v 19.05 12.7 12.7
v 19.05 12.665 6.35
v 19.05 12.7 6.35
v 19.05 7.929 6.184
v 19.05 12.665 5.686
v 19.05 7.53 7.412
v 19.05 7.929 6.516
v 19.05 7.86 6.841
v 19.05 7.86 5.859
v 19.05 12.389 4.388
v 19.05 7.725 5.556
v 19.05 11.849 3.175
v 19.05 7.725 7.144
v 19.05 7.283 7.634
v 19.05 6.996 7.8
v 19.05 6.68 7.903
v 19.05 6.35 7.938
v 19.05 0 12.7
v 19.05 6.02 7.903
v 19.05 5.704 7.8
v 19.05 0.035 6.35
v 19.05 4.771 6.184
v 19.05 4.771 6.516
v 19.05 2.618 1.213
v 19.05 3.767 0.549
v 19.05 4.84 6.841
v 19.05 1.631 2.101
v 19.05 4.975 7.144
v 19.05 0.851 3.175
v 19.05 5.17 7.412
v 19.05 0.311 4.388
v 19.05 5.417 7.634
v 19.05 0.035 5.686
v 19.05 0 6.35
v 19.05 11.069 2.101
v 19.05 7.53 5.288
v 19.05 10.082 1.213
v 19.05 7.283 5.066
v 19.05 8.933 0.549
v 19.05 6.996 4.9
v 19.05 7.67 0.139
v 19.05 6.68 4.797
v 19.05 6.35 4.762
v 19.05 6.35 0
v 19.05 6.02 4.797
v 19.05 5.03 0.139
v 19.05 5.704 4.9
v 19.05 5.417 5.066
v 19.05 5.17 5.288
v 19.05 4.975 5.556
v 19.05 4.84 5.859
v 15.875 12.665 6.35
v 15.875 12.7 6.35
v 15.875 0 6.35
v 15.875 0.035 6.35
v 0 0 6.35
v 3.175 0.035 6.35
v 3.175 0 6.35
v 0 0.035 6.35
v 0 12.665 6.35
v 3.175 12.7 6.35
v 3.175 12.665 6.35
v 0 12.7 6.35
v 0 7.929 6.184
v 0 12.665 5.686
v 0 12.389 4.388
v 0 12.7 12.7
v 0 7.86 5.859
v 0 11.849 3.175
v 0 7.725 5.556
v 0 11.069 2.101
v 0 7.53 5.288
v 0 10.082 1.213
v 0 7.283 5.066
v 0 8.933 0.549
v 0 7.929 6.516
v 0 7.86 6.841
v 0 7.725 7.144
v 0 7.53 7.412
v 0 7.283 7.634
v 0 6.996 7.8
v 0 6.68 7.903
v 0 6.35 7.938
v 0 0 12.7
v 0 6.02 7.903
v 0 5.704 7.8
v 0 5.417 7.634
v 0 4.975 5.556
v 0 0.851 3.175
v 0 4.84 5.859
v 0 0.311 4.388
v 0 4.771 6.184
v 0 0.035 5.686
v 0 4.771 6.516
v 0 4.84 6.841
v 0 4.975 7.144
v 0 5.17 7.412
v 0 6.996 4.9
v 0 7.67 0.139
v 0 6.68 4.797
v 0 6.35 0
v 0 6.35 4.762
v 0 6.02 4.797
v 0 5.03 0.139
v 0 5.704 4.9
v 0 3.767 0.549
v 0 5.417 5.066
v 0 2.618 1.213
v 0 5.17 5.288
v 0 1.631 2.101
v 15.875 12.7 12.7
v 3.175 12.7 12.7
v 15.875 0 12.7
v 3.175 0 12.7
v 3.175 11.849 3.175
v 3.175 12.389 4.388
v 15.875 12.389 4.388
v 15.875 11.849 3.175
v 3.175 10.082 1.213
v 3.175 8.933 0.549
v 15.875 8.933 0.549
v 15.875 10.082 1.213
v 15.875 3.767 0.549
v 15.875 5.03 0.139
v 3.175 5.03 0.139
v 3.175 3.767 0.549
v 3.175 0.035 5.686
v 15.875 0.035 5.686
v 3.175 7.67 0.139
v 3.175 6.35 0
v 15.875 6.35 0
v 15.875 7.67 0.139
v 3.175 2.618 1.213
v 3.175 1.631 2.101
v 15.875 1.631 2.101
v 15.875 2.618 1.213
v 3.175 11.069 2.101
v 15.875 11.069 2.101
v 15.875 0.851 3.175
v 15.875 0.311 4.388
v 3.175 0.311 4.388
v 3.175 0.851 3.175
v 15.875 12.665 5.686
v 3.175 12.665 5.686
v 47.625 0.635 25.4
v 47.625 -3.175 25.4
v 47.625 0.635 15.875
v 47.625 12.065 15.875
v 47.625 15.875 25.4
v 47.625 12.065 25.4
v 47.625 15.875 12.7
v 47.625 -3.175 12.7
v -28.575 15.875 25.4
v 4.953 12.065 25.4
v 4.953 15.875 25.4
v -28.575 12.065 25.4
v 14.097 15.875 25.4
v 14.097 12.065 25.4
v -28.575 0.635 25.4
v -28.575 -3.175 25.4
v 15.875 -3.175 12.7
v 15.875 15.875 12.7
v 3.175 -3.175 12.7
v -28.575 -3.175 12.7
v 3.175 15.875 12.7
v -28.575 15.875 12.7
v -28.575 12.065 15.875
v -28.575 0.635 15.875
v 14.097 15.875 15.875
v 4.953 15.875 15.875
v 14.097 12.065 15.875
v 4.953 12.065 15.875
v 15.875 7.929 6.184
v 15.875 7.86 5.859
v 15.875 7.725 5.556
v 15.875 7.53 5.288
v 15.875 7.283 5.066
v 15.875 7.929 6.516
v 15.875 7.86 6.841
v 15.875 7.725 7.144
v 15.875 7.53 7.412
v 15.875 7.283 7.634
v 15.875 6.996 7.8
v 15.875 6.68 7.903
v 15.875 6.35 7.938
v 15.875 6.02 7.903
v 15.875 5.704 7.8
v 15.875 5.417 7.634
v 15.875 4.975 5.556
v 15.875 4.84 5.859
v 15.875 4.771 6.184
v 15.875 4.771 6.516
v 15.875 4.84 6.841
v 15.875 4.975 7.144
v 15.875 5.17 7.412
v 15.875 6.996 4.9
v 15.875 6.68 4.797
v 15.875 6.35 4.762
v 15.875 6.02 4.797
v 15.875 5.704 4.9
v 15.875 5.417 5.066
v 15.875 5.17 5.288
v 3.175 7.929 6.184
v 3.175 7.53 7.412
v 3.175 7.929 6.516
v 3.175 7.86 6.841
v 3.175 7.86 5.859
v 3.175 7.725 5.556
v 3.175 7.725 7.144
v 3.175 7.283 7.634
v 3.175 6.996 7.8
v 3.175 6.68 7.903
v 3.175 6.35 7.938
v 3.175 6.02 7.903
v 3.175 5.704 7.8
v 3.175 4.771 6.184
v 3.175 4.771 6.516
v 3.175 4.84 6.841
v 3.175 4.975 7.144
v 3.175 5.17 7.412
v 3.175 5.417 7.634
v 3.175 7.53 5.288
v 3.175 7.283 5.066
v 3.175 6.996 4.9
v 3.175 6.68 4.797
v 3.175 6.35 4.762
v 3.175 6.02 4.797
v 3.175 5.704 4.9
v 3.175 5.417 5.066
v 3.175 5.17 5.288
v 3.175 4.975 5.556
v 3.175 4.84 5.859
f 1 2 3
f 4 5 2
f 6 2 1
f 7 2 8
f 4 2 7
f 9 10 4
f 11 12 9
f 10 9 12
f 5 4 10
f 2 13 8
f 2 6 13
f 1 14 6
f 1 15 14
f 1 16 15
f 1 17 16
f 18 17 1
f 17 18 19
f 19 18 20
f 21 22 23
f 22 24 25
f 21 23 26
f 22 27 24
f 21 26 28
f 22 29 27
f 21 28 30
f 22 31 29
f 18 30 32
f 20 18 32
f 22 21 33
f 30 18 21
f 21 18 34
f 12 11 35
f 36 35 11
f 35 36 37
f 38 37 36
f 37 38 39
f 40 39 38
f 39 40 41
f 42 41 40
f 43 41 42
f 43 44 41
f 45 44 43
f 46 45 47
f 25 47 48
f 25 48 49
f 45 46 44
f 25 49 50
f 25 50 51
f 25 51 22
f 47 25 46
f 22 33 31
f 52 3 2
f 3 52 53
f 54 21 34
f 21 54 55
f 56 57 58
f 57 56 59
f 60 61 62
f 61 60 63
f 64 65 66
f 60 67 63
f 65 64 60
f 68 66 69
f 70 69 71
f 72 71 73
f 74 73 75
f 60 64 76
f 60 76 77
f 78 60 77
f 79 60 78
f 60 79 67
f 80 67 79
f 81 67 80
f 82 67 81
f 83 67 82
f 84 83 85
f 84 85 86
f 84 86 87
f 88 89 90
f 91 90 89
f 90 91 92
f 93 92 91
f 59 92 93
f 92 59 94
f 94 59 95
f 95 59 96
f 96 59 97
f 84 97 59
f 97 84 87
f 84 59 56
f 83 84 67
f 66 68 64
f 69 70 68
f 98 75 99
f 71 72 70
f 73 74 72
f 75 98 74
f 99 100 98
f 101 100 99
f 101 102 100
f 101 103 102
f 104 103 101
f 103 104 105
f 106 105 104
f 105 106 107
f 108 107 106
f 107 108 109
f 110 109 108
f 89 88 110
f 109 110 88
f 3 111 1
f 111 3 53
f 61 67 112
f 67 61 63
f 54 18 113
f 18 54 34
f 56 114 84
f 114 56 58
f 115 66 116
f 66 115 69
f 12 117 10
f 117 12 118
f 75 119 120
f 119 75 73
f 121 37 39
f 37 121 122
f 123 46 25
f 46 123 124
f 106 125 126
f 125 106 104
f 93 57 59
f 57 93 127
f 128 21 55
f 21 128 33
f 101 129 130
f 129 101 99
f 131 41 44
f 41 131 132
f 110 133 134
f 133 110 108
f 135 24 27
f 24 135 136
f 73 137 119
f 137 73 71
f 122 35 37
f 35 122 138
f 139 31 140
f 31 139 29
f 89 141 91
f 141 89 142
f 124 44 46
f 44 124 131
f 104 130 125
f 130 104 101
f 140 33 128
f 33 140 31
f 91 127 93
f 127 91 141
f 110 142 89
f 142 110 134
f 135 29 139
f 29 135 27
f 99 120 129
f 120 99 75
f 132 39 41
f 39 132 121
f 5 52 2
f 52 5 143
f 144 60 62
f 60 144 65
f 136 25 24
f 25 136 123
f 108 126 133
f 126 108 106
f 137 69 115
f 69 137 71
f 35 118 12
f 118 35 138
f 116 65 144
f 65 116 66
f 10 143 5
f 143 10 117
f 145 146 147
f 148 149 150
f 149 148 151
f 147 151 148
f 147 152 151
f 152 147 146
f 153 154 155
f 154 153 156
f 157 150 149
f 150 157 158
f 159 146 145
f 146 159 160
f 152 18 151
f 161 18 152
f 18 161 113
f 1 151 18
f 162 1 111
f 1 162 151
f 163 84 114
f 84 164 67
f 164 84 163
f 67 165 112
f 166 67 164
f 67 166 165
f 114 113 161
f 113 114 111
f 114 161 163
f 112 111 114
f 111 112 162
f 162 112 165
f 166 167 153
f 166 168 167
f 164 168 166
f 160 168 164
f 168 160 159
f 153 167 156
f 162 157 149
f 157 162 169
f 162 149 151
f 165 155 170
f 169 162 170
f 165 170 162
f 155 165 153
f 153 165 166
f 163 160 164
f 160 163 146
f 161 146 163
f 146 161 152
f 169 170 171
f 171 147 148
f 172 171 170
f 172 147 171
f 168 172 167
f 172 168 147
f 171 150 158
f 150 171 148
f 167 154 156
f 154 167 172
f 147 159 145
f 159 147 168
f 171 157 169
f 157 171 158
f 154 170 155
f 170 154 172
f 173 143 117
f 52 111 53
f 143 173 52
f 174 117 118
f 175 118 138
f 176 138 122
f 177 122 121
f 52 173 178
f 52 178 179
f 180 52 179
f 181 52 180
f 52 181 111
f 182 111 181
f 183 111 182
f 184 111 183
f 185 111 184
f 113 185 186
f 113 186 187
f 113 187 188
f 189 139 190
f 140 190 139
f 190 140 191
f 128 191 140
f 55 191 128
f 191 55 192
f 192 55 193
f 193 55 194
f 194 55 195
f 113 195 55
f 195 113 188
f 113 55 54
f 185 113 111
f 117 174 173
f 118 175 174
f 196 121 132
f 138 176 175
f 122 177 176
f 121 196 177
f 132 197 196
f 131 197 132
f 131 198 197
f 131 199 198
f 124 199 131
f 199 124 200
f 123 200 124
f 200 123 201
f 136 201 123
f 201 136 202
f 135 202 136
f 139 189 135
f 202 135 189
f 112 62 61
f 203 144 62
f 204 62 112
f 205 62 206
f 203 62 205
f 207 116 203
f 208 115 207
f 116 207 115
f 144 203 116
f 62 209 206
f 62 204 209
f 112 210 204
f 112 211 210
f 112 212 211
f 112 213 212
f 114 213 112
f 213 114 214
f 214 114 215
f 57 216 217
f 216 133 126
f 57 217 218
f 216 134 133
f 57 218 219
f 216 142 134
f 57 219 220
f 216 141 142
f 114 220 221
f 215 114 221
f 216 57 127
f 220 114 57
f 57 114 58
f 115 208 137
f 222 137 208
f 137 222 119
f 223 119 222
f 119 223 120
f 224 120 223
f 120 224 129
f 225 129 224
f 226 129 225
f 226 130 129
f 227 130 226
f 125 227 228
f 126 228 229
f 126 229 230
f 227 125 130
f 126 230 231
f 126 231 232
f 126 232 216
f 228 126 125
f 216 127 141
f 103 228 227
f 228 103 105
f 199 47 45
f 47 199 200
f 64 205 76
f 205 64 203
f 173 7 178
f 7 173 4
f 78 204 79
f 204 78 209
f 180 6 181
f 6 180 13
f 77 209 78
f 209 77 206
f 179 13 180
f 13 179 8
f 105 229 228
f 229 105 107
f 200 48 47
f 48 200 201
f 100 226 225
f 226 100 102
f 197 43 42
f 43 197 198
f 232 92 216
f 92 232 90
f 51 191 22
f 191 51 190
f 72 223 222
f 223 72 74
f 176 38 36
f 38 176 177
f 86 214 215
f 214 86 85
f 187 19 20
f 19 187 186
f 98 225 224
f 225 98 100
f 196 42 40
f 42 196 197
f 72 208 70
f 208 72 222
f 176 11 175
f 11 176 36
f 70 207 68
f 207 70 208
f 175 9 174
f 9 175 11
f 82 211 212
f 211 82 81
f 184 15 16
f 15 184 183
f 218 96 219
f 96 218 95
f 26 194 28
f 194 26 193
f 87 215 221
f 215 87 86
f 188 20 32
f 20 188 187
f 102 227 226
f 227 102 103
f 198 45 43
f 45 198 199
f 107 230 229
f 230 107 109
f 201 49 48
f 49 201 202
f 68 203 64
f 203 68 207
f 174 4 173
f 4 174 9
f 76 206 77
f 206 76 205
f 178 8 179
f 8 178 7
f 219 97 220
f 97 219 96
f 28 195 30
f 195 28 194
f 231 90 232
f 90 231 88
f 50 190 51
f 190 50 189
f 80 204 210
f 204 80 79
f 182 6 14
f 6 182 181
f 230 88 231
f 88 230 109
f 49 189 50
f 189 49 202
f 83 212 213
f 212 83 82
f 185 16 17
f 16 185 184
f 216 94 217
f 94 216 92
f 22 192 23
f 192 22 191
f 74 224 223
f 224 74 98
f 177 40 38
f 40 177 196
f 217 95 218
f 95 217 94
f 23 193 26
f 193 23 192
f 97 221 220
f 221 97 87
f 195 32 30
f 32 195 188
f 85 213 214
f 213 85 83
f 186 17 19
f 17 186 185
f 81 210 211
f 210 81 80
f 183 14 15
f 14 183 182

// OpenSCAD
inch = 25.4;
$fs=0.1;
difference(){
    union(){
        translate([0,0,.25*inch]){
            cube([(3/4)*inch,(1/2)*inch, (0.5)*inch],center=false);
        }
        translate([((3/4)*0.5)*inch, 0.25*inch, 0.25*inch]){
            rotate([0,90,0]){
            cylinder(h=0.75*inch, d=(0.5)*inch, center=true);
            }
        }

        translate([((3/4)/2)*inch, 0.25*inch, (0.75)*inch]){
            cube([3*inch,0.75*inch, 0.5*inch], center=true);
        }
    }
    translate([((3/4)/2)*inch, 0.25*inch, (0.75+0.125)*inch]){
        cube([3*inch,0.45*inch, 0.5*inch], center=true);
    }
    translate([((3/4)/2)*inch, 0.4*inch, (0.75+0.125)*inch]){
        cube([0.36*inch,0.5*inch, 0.5*inch], center=true);
    }
    translate([(1/8)*inch,-0.25*inch, 0]){
     cube([0.5*inch,1*inch,0.5*inch],center=false);
    }
    translate([((3/4)*0.5)*inch, 0.25*inch, 0.25*inch]){
        rotate([0,90,0]){
        cylinder(h=1*inch, d=(0.125)*inch, center=true);
        }
    }
}
